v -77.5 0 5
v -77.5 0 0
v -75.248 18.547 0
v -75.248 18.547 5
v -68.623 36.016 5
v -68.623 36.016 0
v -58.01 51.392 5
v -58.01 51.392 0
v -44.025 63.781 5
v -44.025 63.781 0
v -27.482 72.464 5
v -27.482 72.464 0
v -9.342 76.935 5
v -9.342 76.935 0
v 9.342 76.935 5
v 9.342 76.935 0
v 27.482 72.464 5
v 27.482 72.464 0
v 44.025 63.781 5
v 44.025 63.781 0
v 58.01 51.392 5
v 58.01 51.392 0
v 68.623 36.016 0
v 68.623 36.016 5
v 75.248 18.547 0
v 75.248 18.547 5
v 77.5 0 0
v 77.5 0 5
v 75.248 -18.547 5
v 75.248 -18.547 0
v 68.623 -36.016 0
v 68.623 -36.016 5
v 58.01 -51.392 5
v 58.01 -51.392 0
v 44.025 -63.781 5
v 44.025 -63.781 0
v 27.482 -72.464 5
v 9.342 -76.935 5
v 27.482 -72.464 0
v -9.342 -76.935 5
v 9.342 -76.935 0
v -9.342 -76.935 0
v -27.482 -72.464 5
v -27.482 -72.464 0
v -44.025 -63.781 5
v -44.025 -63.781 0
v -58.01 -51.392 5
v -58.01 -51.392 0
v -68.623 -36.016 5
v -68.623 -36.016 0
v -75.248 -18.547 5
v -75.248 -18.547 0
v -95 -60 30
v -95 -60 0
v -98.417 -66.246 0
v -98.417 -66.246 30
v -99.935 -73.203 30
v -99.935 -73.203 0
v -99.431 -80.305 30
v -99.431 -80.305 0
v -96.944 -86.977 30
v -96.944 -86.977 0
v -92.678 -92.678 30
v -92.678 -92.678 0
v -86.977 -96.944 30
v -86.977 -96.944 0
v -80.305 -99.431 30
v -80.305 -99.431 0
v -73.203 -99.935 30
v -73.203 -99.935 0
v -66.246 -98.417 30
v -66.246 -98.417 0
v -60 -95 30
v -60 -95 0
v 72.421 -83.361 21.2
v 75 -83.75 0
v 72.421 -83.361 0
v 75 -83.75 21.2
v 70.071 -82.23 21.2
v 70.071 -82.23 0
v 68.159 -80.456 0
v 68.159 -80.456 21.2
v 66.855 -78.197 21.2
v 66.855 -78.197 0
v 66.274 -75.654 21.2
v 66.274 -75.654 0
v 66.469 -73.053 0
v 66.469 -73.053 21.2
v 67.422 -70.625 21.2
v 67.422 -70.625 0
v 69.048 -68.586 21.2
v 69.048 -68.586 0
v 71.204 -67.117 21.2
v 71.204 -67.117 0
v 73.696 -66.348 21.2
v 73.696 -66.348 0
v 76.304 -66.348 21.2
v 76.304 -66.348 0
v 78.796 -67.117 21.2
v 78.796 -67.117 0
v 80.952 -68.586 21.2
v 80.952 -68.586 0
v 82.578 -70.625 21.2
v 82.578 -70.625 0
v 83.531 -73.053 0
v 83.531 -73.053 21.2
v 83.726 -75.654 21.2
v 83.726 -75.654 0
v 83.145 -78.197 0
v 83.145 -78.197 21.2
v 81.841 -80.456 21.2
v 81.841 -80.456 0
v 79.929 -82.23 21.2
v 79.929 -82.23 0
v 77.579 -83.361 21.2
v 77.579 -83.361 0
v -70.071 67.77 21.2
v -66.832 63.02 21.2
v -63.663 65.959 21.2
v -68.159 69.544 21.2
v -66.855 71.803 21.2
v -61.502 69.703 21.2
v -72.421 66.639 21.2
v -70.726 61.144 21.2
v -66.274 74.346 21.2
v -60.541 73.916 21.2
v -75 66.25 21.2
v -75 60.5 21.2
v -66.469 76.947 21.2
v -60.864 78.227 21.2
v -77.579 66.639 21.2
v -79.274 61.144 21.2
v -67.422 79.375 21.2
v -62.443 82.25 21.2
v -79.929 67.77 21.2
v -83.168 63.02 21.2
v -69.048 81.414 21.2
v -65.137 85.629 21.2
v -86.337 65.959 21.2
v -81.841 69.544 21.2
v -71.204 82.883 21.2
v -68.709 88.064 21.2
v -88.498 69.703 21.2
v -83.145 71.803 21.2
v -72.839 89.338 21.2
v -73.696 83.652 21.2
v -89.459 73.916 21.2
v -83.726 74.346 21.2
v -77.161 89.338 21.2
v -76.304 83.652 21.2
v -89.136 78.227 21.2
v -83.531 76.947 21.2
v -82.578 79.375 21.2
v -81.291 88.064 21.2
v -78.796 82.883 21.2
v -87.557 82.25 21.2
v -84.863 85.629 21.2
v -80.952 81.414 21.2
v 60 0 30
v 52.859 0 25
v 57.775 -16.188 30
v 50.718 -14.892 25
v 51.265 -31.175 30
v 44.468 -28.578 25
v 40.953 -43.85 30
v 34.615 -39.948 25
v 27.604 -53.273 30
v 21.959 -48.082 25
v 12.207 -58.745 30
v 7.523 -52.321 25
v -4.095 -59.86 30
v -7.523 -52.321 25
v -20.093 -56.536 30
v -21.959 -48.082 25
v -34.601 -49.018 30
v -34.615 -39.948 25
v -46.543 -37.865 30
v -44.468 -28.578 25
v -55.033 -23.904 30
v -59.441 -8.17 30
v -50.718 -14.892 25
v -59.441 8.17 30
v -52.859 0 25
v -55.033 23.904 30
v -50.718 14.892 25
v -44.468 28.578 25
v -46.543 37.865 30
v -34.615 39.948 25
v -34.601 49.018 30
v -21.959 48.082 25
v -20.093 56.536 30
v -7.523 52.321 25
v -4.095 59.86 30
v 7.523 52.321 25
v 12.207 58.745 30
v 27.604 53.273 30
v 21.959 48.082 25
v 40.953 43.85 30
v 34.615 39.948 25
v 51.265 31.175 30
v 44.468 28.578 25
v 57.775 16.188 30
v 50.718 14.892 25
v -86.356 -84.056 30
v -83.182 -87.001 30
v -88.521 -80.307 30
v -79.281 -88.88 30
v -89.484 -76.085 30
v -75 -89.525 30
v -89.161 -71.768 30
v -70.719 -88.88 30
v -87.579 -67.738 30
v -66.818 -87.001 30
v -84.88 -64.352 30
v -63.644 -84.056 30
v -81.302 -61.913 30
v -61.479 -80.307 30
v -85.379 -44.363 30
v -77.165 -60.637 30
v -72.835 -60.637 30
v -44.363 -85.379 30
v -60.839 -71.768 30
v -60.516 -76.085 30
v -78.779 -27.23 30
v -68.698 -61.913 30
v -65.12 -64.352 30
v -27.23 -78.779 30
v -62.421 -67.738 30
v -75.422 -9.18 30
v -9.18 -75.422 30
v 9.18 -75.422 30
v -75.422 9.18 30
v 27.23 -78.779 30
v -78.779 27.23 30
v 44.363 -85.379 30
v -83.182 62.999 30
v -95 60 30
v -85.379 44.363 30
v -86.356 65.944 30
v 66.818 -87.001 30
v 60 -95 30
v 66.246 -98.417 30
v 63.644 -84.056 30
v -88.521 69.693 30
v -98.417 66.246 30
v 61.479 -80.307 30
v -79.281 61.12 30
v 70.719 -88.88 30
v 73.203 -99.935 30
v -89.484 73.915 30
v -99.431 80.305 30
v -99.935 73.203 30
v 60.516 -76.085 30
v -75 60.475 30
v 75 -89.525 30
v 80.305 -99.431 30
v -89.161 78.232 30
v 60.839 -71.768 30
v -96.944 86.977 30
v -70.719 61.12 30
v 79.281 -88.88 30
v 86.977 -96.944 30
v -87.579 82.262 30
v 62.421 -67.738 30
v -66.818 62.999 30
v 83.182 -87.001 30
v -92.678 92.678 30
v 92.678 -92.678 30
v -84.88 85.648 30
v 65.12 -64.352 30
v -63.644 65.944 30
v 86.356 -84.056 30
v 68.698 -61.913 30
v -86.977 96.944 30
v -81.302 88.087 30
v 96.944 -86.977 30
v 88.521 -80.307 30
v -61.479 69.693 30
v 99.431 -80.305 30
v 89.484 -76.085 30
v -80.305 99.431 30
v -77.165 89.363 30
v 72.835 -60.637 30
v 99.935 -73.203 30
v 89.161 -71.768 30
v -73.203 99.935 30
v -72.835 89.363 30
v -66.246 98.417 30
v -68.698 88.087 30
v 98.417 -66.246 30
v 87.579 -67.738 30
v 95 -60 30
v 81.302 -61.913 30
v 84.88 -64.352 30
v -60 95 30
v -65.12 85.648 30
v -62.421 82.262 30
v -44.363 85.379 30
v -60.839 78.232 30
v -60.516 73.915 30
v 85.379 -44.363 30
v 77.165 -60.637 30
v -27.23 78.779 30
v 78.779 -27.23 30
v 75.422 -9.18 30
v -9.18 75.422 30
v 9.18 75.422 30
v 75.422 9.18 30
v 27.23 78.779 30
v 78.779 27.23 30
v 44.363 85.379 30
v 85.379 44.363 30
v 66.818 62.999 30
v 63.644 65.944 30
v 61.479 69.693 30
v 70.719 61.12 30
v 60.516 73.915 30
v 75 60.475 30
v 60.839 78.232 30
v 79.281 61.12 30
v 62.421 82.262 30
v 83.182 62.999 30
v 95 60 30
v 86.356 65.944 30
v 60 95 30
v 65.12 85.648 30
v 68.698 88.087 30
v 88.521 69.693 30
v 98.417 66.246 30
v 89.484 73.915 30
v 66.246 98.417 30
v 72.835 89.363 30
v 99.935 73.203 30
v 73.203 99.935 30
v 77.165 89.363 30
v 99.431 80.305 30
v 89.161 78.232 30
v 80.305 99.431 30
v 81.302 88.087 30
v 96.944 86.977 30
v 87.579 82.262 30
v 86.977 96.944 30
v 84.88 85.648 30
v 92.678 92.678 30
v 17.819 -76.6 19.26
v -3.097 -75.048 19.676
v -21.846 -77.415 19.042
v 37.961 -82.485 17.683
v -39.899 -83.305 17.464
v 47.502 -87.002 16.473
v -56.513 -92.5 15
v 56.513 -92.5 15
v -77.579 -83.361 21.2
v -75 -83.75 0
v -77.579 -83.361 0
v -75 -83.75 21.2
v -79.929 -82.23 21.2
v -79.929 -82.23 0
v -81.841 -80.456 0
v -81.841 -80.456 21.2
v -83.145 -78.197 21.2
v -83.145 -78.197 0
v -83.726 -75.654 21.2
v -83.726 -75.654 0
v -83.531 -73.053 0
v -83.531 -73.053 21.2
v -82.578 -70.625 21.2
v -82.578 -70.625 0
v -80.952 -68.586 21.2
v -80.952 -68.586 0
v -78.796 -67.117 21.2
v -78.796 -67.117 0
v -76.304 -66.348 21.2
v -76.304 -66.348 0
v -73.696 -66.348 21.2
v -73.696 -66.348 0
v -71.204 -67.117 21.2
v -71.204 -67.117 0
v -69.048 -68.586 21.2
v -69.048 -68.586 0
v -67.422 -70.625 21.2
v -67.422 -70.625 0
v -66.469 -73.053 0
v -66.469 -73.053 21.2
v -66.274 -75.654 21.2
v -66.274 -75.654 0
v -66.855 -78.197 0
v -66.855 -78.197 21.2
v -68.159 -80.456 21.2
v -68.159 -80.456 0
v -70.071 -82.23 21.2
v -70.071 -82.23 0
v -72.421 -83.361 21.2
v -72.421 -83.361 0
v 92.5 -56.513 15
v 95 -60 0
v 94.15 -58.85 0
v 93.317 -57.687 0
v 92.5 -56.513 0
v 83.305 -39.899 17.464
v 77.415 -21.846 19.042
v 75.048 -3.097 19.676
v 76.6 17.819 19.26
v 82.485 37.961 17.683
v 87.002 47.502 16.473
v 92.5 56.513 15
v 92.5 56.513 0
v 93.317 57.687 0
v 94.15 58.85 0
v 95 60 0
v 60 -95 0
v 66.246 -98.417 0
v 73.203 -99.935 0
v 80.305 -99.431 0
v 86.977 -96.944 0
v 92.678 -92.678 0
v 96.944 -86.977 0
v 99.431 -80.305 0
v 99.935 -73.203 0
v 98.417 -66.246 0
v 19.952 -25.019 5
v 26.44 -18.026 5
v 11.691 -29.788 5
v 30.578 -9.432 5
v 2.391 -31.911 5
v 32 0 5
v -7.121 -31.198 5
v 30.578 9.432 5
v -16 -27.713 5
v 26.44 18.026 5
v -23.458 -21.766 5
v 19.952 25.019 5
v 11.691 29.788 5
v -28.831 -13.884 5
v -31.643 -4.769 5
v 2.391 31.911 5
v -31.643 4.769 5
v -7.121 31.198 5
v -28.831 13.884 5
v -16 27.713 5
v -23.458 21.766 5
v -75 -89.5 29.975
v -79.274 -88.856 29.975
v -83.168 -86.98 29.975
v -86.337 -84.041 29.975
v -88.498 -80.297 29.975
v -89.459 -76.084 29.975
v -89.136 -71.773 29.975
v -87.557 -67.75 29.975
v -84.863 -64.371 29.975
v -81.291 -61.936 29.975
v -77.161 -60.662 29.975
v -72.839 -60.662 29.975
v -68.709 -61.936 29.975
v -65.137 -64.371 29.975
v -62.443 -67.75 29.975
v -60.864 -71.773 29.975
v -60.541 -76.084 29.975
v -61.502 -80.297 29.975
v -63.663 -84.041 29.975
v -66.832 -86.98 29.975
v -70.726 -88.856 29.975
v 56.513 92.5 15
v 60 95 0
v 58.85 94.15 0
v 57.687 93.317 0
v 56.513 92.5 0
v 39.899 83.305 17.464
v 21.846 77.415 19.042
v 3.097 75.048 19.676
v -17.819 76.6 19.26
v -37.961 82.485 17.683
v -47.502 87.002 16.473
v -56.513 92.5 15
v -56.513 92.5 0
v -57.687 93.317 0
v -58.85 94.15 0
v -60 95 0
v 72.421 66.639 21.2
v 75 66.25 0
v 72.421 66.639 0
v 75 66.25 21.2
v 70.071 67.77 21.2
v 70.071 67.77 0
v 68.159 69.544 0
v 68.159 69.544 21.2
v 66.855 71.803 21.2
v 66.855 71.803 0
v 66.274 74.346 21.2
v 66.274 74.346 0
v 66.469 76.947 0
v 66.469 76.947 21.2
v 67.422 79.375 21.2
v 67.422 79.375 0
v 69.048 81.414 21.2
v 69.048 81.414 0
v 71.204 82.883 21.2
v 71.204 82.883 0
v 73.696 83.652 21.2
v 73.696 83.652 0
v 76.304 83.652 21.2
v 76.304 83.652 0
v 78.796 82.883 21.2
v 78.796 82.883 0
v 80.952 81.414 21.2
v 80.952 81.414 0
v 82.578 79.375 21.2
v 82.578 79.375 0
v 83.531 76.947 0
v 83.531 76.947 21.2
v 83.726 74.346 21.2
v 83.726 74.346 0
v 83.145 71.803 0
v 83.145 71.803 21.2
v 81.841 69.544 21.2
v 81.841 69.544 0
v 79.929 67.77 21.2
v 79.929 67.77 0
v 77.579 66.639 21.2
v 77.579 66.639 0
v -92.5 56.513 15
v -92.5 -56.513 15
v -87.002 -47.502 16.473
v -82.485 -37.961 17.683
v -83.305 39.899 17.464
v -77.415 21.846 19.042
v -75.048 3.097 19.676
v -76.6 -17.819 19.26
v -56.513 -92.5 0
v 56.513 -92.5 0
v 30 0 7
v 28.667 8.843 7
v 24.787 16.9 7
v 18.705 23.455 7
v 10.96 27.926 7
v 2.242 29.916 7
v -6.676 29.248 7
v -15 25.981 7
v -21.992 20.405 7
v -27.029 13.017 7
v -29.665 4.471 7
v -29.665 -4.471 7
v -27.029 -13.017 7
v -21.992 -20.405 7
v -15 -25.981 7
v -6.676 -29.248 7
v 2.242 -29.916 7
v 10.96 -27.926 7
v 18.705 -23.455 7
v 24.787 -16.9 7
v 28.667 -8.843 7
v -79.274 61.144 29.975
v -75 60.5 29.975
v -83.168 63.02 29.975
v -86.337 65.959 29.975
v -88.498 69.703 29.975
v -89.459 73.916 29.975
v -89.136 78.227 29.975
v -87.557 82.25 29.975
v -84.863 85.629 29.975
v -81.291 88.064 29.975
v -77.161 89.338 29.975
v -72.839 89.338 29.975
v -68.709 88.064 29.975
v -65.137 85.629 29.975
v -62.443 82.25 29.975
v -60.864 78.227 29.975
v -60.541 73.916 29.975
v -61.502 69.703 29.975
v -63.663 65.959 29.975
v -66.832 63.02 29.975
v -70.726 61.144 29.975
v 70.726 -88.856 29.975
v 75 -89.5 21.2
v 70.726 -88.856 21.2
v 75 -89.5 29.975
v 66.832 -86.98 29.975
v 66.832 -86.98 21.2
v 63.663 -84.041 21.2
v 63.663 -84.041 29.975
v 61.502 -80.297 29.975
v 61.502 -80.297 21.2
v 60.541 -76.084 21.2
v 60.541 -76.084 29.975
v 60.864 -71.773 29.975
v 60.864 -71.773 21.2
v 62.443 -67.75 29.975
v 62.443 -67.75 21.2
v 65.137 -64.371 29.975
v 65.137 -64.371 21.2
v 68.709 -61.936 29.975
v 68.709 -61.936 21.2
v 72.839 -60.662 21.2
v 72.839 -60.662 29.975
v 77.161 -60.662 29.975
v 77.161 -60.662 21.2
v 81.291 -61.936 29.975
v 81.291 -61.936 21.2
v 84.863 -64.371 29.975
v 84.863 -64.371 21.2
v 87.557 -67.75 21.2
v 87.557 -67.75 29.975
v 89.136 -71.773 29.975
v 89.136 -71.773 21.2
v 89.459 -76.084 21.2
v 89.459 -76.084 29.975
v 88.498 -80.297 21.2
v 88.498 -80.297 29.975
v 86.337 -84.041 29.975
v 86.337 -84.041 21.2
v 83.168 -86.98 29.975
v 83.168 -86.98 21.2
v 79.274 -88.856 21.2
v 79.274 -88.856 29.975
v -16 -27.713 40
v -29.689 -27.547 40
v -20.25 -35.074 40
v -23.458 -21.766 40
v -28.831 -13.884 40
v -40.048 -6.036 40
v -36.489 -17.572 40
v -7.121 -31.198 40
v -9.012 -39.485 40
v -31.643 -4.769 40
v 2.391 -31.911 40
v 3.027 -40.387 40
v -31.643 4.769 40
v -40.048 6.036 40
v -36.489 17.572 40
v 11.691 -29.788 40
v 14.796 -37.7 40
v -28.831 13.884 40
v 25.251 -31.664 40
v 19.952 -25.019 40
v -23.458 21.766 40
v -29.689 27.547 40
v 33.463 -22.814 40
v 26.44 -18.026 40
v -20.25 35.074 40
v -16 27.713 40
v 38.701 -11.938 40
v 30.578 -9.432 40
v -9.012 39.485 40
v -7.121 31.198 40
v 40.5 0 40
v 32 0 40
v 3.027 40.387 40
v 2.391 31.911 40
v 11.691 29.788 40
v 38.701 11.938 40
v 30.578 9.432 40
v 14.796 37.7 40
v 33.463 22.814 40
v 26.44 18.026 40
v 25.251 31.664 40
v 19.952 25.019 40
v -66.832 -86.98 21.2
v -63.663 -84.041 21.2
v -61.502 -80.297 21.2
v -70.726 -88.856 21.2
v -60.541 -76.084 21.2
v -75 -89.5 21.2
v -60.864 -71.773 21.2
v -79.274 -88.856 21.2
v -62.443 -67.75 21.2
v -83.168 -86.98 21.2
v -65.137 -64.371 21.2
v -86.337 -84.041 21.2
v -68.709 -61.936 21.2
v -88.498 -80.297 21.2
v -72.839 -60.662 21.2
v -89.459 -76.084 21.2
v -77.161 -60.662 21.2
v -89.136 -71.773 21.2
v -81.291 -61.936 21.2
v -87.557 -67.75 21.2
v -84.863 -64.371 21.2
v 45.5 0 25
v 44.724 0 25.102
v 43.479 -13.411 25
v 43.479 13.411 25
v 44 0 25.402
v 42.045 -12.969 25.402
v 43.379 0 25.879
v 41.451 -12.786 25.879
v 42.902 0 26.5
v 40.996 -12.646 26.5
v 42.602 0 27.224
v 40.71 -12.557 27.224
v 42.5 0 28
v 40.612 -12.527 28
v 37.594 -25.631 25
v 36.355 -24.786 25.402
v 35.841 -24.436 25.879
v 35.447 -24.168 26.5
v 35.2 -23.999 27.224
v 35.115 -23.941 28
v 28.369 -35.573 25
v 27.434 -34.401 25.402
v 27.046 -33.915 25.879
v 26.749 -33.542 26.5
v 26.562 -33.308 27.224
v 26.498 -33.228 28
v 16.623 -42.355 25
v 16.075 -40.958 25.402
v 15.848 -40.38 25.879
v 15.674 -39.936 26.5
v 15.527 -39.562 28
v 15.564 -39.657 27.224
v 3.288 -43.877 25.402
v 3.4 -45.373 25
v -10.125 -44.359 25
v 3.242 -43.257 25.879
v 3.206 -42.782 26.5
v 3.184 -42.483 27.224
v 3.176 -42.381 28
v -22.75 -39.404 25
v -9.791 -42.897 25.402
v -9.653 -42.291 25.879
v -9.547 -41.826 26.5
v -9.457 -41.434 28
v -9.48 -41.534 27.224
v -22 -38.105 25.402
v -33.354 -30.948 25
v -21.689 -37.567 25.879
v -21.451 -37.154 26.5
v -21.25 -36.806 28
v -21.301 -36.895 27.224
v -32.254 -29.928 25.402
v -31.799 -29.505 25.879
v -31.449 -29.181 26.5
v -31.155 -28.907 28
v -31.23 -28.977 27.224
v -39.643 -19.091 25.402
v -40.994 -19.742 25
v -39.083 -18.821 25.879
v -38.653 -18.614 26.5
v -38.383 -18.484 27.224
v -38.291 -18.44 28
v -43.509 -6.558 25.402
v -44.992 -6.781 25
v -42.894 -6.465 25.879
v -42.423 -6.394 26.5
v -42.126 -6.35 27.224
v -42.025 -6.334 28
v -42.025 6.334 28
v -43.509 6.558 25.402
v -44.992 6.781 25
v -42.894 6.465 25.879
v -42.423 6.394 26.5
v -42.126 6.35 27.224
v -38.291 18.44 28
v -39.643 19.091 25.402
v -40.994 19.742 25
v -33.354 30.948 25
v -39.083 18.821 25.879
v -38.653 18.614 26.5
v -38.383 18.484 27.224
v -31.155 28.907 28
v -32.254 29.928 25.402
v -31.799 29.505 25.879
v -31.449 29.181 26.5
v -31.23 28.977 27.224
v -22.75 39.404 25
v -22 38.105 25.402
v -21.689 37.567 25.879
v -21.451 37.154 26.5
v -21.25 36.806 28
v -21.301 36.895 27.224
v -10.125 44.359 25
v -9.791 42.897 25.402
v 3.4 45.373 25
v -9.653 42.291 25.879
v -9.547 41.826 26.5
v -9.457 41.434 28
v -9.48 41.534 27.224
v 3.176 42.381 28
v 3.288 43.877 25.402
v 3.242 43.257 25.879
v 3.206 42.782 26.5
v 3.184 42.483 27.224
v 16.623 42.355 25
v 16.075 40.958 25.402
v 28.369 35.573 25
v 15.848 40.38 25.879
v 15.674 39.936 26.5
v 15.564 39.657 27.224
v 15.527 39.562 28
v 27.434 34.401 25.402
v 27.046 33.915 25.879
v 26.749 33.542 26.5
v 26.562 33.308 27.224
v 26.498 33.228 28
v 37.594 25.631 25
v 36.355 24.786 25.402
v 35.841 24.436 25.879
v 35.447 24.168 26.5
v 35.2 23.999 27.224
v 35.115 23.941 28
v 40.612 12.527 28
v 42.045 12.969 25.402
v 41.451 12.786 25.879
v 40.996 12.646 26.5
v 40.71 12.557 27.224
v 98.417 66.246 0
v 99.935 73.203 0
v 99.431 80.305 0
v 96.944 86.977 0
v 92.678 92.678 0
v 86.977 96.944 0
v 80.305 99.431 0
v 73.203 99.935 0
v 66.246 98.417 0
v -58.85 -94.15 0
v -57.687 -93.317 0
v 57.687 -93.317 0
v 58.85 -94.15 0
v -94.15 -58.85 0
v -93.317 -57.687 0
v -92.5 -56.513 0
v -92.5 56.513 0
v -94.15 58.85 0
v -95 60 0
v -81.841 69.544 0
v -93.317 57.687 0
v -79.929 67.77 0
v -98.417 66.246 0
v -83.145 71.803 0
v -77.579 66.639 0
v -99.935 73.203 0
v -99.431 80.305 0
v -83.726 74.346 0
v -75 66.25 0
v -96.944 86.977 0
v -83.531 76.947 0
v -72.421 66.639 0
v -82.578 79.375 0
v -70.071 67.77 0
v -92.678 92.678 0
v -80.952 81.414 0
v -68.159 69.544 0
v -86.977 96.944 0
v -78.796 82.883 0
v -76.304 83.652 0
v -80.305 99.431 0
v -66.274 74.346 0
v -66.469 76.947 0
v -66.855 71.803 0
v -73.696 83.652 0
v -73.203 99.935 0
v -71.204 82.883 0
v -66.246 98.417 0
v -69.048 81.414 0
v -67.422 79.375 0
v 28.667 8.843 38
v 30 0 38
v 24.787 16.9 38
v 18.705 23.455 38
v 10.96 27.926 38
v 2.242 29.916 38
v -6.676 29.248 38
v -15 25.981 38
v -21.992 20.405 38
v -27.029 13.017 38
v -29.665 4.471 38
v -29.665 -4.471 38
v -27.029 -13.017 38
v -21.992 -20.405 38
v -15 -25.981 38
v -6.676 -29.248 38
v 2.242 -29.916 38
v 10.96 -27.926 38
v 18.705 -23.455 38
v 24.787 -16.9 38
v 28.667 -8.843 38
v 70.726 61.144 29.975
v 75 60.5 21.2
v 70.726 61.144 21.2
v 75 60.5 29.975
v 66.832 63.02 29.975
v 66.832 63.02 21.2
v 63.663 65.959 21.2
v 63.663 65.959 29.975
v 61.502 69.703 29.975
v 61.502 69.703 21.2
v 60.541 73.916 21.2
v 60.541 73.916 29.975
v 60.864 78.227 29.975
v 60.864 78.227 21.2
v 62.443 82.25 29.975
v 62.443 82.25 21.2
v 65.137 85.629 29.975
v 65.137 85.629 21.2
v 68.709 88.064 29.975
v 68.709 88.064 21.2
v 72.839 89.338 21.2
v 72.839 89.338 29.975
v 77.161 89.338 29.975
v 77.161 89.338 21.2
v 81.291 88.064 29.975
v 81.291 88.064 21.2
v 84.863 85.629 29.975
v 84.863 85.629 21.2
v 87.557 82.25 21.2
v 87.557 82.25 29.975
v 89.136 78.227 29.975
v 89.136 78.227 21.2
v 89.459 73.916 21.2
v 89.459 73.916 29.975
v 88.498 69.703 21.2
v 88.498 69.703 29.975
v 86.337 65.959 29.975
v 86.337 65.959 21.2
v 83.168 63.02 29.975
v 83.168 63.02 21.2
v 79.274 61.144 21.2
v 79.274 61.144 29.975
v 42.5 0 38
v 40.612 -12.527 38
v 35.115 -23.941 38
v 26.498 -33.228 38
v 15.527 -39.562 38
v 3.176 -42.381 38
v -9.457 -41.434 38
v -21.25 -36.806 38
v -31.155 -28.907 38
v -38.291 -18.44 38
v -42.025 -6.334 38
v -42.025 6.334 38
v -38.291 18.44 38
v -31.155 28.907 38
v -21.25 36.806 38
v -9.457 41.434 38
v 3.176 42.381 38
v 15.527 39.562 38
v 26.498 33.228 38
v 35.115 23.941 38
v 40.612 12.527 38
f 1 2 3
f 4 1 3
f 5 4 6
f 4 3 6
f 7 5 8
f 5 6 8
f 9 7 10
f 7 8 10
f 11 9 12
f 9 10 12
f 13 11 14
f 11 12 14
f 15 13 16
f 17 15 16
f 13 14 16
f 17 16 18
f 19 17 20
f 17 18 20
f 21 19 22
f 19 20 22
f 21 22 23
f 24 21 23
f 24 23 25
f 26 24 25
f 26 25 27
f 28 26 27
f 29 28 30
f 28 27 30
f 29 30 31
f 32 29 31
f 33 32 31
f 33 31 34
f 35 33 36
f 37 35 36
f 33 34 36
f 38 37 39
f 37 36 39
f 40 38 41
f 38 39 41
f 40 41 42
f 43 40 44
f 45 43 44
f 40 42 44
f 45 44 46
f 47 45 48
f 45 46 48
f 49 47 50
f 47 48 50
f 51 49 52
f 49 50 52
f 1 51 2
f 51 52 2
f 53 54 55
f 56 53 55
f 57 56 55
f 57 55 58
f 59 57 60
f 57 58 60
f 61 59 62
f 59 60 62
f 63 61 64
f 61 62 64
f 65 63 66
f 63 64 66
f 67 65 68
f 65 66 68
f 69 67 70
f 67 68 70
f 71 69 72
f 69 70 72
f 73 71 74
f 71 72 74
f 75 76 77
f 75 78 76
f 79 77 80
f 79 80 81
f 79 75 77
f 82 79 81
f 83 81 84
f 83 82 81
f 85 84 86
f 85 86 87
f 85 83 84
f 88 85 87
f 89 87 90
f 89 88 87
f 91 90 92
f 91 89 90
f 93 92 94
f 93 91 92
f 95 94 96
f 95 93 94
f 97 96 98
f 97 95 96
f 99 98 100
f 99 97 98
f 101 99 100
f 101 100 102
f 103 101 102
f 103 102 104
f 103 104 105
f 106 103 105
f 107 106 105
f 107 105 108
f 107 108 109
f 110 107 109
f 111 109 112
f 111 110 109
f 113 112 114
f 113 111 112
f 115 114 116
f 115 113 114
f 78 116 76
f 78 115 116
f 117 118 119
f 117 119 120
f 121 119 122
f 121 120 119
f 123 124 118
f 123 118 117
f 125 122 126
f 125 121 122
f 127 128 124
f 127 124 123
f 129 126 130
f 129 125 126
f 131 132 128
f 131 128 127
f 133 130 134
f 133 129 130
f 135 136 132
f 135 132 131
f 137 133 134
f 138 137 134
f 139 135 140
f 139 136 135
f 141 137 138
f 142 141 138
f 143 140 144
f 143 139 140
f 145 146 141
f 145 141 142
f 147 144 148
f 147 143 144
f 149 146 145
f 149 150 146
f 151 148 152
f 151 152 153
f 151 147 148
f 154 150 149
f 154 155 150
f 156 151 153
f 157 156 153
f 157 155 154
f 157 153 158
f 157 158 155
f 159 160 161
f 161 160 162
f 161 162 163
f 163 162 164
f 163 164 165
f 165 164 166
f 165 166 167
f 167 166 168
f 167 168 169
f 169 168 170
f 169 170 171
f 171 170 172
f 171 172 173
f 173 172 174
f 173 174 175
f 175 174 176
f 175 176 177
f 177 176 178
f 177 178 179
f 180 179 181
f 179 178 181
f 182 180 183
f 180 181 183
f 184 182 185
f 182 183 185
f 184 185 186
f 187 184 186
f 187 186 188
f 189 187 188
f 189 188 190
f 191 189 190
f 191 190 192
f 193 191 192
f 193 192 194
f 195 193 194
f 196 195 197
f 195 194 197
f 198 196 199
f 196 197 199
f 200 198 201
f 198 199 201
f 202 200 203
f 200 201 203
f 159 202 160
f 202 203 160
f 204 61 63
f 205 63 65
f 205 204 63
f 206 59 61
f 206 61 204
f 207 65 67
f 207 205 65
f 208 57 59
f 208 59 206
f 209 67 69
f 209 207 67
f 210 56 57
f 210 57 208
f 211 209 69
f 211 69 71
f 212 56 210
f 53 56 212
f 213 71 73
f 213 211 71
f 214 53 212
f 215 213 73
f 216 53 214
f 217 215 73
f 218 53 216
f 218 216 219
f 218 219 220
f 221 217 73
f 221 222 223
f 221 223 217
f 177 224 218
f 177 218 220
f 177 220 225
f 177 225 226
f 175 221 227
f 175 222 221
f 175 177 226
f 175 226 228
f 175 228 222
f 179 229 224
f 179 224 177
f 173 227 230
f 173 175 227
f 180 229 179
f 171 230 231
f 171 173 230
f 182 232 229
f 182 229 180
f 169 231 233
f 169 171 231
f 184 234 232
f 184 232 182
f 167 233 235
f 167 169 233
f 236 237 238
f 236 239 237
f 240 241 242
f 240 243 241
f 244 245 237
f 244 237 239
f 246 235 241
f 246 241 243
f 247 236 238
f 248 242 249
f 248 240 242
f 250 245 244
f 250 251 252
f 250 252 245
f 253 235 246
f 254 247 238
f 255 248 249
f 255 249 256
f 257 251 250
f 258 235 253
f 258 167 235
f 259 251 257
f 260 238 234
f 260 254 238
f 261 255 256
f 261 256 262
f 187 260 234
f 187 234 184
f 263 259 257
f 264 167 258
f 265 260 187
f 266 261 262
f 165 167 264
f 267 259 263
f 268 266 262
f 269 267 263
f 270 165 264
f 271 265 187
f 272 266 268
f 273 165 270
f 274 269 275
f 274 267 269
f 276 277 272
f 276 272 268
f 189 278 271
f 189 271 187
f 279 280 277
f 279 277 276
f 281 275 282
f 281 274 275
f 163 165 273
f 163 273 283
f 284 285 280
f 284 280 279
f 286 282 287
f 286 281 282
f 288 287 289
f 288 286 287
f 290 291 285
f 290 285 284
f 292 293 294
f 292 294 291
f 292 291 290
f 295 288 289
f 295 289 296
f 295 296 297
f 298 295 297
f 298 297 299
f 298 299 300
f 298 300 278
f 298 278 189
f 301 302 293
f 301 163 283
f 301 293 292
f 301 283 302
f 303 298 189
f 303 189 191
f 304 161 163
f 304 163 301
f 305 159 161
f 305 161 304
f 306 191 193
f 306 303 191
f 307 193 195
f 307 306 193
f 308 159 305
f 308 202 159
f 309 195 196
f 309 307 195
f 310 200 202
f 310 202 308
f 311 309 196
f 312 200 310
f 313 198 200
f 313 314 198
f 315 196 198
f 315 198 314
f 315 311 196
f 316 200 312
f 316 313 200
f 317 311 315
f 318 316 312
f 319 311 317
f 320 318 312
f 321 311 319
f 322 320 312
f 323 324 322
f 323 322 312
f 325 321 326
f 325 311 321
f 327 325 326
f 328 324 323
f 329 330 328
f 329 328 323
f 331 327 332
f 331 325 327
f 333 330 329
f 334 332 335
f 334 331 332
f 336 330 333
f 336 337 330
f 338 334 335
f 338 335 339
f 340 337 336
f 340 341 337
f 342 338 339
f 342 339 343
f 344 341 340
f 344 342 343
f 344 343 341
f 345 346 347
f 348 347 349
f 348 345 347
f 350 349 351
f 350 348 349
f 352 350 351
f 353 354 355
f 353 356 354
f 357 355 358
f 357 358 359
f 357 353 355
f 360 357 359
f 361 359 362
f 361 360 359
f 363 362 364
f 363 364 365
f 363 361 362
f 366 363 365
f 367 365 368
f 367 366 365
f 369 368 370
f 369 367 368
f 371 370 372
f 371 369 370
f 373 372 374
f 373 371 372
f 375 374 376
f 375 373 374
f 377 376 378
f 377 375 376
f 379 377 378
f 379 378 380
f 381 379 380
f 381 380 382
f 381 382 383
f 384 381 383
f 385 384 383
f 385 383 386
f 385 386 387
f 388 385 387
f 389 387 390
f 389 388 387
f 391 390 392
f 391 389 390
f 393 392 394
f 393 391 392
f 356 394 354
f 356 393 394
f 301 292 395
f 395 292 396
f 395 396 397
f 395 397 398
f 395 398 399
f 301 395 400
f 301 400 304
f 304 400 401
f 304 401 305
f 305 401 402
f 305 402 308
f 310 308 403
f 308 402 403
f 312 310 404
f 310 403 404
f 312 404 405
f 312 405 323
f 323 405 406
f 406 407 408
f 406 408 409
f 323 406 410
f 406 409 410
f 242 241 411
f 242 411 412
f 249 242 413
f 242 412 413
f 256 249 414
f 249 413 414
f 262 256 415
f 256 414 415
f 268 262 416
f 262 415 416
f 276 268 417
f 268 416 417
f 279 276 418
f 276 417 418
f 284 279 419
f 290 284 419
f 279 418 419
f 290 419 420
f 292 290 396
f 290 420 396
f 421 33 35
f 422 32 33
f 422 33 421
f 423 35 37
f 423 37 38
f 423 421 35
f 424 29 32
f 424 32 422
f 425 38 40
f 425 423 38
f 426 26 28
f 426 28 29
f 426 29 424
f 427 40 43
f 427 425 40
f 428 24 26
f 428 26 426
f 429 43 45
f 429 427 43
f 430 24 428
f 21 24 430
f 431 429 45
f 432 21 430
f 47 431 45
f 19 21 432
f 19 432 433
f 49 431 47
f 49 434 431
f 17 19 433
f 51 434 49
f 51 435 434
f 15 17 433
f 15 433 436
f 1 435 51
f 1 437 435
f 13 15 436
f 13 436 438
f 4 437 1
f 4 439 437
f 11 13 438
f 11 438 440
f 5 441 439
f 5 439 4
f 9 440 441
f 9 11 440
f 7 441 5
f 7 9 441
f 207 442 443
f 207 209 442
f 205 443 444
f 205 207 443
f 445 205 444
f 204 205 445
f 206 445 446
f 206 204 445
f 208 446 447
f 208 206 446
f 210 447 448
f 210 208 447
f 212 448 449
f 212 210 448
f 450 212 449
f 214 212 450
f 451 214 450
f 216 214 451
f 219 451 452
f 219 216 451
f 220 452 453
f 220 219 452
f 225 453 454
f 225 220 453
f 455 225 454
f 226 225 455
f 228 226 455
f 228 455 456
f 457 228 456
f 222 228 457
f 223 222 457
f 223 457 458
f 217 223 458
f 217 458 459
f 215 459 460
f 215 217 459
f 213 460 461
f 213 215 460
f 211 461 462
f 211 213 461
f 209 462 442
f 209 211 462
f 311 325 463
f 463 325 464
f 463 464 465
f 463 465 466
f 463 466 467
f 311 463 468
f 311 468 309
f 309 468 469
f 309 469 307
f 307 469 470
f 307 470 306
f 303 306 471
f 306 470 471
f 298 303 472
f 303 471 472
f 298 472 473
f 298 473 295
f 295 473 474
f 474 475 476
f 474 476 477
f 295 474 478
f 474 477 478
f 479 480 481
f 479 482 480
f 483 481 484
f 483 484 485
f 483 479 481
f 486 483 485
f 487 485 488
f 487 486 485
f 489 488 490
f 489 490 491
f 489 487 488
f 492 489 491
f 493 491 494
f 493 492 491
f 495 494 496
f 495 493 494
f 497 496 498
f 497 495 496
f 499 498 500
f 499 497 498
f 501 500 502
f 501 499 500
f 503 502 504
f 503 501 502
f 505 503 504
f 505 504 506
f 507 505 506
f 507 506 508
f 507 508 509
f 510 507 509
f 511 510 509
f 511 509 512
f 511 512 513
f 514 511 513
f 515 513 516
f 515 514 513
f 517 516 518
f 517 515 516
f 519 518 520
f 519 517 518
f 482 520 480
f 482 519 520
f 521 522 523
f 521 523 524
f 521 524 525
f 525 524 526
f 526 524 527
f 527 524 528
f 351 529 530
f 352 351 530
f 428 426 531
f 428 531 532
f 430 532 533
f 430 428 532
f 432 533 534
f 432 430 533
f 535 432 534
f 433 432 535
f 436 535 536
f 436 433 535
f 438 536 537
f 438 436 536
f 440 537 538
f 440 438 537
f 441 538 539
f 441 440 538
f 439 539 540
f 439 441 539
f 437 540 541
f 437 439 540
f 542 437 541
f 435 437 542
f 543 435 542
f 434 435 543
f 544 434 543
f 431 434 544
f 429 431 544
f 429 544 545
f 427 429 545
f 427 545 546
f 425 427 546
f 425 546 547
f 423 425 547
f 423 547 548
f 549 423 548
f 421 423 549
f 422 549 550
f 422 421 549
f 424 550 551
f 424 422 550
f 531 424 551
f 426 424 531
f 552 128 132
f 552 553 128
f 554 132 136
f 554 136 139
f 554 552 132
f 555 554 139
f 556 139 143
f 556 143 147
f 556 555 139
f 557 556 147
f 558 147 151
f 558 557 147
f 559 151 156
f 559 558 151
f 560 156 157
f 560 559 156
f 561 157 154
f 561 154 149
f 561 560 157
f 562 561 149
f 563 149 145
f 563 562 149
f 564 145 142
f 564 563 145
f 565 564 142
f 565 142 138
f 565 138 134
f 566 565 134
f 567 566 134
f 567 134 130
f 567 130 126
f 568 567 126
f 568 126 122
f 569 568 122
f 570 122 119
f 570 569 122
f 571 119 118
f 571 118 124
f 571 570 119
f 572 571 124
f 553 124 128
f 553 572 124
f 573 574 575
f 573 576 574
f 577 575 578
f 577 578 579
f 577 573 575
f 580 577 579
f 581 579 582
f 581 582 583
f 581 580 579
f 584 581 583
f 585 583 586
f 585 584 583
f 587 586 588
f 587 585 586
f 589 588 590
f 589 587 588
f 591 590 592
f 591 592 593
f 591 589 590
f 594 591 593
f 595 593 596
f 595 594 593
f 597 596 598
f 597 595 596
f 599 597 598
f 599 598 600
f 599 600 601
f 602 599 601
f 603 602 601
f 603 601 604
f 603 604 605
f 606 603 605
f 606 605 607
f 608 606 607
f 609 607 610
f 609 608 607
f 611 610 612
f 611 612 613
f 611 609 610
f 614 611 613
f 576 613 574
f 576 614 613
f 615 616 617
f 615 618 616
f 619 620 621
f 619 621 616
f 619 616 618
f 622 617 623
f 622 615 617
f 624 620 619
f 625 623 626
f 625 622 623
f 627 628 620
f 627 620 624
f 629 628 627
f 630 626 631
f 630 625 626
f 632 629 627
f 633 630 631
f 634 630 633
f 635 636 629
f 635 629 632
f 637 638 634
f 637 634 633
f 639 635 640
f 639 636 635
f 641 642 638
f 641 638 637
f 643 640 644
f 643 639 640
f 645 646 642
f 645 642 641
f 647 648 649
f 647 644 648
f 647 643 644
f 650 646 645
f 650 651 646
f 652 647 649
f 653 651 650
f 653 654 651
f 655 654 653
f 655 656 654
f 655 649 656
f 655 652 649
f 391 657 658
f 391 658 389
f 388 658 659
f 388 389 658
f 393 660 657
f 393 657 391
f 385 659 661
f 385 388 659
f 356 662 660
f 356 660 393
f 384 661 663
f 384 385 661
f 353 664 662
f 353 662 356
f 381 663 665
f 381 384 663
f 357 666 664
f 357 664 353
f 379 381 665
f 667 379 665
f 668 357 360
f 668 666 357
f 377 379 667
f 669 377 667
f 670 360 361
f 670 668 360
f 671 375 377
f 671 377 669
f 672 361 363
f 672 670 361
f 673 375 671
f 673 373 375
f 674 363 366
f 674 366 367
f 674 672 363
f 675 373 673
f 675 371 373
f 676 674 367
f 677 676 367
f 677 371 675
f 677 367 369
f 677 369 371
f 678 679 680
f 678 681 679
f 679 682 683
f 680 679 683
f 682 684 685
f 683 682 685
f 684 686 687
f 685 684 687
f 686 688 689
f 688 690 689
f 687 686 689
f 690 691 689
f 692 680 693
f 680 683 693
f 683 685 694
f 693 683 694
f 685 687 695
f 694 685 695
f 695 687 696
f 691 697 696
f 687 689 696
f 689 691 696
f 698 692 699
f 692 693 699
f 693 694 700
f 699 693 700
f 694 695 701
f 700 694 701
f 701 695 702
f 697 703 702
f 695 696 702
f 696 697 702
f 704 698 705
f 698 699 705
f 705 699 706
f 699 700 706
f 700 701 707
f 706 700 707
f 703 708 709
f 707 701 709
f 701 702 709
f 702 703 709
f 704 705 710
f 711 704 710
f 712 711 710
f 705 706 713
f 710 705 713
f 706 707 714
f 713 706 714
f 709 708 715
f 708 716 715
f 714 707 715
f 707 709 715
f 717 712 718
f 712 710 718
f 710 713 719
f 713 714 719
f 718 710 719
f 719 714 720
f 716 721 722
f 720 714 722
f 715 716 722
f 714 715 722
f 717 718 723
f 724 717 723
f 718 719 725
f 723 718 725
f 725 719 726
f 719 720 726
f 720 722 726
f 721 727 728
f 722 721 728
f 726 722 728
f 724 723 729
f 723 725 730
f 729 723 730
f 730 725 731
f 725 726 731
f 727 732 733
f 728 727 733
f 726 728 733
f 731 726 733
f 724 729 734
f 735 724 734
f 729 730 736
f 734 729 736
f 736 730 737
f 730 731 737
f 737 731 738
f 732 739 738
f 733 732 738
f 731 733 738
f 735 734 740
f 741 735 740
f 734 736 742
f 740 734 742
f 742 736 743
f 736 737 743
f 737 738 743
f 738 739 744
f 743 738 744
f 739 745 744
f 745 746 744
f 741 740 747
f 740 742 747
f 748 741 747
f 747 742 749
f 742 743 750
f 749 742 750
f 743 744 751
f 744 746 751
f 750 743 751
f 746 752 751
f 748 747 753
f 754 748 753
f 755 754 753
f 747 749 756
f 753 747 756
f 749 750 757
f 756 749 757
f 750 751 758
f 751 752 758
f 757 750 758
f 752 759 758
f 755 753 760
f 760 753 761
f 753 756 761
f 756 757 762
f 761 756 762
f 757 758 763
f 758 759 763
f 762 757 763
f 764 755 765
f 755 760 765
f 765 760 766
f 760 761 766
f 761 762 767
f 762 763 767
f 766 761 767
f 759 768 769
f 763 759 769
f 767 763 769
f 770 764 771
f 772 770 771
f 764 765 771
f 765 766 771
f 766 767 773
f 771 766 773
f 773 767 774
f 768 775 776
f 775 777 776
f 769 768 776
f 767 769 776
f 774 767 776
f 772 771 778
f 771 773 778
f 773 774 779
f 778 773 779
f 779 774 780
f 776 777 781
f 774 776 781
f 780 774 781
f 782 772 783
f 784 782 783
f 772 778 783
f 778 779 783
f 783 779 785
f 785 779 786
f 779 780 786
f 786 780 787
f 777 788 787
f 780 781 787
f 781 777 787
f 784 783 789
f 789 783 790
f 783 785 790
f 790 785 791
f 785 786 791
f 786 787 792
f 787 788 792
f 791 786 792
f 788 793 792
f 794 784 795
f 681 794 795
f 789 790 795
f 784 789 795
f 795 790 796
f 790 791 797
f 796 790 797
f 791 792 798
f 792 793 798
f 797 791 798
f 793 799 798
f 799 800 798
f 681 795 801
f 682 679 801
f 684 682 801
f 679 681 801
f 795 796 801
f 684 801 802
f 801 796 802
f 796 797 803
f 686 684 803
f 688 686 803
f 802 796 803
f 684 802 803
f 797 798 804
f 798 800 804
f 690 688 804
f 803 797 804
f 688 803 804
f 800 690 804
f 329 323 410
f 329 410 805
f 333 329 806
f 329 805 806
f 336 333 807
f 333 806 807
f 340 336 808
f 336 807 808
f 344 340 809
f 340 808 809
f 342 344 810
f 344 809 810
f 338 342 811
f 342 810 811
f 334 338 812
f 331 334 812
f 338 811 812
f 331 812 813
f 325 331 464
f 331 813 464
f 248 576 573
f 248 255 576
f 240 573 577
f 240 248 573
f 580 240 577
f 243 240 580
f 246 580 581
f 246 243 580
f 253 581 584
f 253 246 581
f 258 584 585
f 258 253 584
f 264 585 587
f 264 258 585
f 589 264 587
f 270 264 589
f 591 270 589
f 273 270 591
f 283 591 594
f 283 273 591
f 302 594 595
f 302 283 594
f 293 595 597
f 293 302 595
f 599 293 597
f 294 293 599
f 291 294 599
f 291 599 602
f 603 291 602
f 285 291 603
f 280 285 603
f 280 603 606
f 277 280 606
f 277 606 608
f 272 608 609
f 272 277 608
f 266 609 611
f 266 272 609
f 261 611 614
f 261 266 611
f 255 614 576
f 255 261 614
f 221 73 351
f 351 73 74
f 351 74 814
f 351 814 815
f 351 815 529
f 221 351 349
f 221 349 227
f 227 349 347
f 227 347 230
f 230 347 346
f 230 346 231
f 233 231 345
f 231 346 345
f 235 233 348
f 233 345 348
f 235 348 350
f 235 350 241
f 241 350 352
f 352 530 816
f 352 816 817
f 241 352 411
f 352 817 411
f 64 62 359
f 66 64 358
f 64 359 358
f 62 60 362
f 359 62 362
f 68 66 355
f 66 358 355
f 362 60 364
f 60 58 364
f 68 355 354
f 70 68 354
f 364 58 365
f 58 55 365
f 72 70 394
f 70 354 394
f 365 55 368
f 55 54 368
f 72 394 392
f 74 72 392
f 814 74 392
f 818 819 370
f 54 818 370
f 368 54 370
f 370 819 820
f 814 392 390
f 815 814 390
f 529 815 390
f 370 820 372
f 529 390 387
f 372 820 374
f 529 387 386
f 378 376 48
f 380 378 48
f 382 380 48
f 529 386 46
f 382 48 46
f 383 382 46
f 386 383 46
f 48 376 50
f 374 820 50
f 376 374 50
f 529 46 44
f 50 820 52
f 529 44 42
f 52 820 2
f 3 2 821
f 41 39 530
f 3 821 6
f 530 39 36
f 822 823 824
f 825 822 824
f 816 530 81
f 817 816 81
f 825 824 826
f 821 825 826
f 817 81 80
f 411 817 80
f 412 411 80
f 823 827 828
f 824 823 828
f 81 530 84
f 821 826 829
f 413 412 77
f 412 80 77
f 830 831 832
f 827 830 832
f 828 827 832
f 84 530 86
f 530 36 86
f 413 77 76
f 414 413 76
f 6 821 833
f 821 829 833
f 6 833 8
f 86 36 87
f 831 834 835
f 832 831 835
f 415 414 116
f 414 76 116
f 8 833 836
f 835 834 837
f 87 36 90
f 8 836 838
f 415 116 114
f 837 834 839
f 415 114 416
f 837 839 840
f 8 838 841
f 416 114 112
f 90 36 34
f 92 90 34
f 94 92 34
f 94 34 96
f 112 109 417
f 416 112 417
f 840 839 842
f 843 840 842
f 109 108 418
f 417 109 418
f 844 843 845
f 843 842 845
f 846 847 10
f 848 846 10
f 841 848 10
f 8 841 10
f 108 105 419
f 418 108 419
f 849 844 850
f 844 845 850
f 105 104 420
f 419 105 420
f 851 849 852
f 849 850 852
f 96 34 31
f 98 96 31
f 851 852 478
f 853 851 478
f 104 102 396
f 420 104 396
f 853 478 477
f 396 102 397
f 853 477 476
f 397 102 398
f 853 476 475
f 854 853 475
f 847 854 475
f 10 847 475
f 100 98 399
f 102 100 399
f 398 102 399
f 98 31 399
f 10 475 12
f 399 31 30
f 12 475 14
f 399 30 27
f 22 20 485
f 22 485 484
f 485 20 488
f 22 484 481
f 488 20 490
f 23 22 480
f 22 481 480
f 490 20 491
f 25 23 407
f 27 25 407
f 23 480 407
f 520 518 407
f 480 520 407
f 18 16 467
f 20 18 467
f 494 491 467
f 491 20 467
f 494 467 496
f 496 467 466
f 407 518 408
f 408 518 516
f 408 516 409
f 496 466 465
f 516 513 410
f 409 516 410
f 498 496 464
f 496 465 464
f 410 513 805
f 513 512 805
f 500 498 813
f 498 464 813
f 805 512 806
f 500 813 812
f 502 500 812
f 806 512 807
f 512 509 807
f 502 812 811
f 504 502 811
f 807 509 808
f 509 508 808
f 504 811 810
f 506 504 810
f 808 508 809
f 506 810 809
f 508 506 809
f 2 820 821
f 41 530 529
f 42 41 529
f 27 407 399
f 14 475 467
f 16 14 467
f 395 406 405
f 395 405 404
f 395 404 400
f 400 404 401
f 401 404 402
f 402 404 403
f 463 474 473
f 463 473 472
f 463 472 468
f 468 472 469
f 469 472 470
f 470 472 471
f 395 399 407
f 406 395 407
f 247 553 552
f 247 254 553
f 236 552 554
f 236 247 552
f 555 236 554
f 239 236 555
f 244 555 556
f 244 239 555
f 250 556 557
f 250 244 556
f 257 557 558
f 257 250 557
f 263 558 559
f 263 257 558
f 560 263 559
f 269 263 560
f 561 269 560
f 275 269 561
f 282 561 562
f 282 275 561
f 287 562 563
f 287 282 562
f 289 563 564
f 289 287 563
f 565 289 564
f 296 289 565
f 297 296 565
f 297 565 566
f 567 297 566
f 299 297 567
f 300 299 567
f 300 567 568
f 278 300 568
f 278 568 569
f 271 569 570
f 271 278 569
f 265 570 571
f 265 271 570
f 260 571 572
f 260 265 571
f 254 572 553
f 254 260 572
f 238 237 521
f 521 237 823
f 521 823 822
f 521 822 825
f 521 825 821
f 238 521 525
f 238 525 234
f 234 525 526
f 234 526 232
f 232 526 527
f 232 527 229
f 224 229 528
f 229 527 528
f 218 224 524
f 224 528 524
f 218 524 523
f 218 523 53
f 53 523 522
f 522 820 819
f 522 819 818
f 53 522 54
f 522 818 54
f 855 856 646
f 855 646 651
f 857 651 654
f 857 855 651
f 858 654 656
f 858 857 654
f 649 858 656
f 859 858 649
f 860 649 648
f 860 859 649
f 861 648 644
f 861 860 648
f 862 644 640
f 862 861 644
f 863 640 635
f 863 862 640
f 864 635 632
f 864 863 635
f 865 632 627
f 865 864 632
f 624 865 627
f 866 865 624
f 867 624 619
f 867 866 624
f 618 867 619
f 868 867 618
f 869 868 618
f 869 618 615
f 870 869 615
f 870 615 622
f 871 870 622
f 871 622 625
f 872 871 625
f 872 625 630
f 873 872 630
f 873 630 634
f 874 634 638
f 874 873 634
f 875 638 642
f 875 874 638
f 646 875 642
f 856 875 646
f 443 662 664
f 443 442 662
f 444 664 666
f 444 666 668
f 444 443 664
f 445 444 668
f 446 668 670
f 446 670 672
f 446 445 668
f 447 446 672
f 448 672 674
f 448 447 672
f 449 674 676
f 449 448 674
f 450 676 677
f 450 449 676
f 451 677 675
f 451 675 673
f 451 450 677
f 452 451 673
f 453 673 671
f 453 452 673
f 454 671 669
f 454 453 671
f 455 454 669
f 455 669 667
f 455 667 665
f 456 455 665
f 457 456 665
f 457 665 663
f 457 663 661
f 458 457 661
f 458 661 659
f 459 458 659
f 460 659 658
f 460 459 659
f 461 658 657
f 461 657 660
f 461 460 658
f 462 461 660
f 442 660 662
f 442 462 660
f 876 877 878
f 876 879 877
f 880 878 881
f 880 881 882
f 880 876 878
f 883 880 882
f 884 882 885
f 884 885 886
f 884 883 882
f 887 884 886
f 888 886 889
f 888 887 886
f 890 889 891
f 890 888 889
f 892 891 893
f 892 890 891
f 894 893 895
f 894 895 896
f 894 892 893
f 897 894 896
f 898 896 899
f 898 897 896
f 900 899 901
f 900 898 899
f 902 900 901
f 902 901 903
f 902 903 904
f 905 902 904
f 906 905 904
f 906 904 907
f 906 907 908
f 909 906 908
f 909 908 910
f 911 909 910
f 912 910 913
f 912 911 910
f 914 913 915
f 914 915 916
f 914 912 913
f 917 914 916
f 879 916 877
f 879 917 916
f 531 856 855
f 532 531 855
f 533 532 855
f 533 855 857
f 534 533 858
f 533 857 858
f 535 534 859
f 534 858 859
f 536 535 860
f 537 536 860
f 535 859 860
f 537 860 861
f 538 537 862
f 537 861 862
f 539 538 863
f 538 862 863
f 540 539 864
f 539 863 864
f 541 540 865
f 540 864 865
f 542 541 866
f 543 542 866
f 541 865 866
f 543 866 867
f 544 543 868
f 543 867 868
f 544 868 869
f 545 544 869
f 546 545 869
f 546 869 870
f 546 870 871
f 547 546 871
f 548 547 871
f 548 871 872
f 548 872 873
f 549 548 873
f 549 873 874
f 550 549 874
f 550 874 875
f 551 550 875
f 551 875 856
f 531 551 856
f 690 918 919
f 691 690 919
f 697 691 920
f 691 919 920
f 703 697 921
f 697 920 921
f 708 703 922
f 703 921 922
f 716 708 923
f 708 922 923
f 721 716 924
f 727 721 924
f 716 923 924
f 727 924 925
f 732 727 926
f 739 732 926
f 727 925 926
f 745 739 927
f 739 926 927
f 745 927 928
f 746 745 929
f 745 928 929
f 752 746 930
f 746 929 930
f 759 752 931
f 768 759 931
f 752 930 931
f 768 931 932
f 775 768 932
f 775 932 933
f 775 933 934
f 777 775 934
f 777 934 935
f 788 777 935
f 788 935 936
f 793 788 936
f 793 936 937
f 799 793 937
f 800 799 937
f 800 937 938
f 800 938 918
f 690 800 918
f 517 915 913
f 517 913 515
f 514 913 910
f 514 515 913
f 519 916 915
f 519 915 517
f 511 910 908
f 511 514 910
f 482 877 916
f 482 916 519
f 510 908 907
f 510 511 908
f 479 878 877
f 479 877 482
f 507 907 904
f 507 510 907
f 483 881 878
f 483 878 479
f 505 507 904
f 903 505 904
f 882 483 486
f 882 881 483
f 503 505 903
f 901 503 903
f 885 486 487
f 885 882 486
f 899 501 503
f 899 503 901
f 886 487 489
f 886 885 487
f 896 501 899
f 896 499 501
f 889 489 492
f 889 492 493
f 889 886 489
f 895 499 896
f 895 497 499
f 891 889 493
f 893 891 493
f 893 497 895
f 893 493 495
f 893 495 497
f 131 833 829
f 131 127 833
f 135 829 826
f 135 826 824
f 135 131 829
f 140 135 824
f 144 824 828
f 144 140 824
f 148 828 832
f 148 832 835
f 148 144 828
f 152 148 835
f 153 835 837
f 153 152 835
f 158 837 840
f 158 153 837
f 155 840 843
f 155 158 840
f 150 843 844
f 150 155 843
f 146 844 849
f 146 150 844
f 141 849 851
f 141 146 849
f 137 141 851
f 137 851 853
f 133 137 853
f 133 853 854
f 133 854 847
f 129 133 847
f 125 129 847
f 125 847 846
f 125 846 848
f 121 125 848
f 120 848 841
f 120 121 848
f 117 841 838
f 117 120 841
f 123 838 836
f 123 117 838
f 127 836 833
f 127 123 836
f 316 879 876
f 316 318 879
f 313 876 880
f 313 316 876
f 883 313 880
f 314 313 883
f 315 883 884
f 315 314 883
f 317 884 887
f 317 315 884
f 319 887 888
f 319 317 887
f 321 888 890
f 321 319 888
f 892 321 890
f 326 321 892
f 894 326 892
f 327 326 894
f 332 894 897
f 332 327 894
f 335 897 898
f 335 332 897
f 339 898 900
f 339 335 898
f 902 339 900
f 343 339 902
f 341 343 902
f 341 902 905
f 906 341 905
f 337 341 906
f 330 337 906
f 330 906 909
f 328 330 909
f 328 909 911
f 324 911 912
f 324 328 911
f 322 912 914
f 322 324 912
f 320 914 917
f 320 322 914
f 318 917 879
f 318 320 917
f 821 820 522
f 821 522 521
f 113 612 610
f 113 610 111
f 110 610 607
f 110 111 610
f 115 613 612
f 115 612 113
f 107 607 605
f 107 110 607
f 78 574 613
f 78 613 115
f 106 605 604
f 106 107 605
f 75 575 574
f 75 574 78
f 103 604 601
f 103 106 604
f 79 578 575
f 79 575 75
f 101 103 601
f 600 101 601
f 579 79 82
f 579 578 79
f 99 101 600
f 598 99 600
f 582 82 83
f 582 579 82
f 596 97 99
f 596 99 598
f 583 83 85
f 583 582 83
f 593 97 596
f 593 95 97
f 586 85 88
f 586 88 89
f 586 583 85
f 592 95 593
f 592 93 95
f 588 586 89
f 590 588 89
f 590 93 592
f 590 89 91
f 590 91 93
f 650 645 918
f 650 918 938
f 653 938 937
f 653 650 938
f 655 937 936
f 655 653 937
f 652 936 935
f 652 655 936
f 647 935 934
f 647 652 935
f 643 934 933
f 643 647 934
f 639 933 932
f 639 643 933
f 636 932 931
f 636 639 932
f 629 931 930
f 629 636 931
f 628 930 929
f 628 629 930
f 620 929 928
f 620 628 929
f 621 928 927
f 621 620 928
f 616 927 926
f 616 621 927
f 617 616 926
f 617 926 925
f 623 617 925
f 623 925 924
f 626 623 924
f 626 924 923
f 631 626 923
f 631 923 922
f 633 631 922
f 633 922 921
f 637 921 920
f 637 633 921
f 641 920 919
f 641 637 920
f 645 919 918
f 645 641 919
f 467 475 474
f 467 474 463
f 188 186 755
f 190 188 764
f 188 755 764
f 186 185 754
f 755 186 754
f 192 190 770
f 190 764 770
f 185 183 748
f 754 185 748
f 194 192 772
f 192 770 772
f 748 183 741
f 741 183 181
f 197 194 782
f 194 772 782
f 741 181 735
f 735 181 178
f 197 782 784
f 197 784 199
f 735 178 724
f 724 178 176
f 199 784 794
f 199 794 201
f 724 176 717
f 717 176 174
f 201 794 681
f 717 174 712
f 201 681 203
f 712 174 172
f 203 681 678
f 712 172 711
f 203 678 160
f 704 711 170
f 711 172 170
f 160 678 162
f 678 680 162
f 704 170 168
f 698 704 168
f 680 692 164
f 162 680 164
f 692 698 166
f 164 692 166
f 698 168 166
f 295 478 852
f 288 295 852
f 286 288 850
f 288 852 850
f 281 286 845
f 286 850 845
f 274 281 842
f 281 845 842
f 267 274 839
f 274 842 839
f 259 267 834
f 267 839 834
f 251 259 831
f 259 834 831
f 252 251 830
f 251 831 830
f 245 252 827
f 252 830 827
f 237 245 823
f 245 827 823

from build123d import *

# Parameters (mm, degrees)
SKETCH1_R                       = 25
BOSS_EXTRUDE1_DEPTH             = 30
SKETCH2_W                       = 185
SKETCH2_H                       = 185
BOSS_EXTRUDE2_DEPTH             = 15
DRAFT1_ANGLE                    = 15
DRAFT2_ANGLE                    = 15
DRAFT3_ANGLE                    = 15
DRAFT4_ANGLE                    = 15
SKETCH3_R                       = 42.5
BOSS_EXTRUDE3_DEPTH             = 40
CBORE_FOR_M16_SBHCS1_AT_2_COUNT = 2
CBORE_FOR_M16_SBHCS1_AT_2_PITCH = 150
CBORE_FOR_M16_SBHCS1_AT_3_COUNT = 2
CBORE_FOR_M16_SBHCS1_AT_3_PITCH = 150
CBORE_FOR_M16_SBHCS1_AT_4_COUNT = 2
CBORE_FOR_M16_SBHCS1_AT_4_PITCH = 212.132034356
SKETCH6_R                       = 30
CUT_EXTRUDE1_DEPTH              = 147.969384567
SKETCH7_R                       = 77.5
CUT_EXTRUDE2_DEPTH              = 5
FILLET1_R                       = 3
CHAMFER1_SIZE                   = 2


with BuildPart() as part:
    # Sketch1 → Boss-Extrude1 (new body)
    with BuildSketch(Plane.XY):
        with BuildLine():
            ThreePointArc((-60, 95), (-52.639320225, 86.180339887), (-50, 75))
            ThreePointArc((-50, 75), (-67.09430585, 51.282917549), (-95, 60))
            ThreePointArc((-95, 60), (-75, 0), (-95, -60))
            ThreePointArc((-95, -60), (-67.09430585, -51.282917549), (-50, -75))
            ThreePointArc((-50, -75), (-52.639320225, -86.180339887), (-60, -95))
            ThreePointArc((-60, -95), (0, -75), (60, -95))
            ThreePointArc((60, -95), (57.32233047, -57.32233047), (95, -60))
            ThreePointArc((95, -60), (75, 0), (95, 60))
            ThreePointArc((95, 60), (57.32233047, 57.32233047), (60, 95))
            ThreePointArc((60, 95), (0, 75), (-60, 95))
        make_face()
        with Locations((-75, 75)):
            Circle(SKETCH1_R)
        with Locations((75, 75)):
            Circle(SKETCH1_R)
        with Locations((75, -75)):
            Circle(SKETCH1_R)
        with Locations((-75, -75)):
            Circle(SKETCH1_R)
    extrude(amount=BOSS_EXTRUDE1_DEPTH)

    # Sketch2 → Boss-Extrude2 (add)
    with BuildSketch(Plane.XY):
        Rectangle(SKETCH2_W, SKETCH2_H)
    extrude(amount=BOSS_EXTRUDE2_DEPTH)

    # Draft1
    draft1_faces = [part.faces().sort_by_distance(p)[0] for p in [
        (85.444692503, 0, 15),
    ]]
    draft(draft1_faces, Plane(origin=(92.5, -92.5, 15), x_dir=(0, 0, 1), z_dir=(1, 0, 0)), DRAFT1_ANGLE)

    # Draft2
    draft2_faces = [part.faces().sort_by_distance(p)[0] for p in [
        (0, 85.444692503, 15),
    ]]
    draft(draft2_faces, Plane(origin=(-92.5, 92.5, 15), x_dir=(0, 0, 1), z_dir=(0, 1, 0)), DRAFT2_ANGLE)

    # Draft3
    draft3_faces = [part.faces().sort_by_distance(p)[0] for p in [
        (-85.444692503, 0, 15),
    ]]
    draft(draft3_faces, Plane(origin=(-92.5, -92.5, 15), x_dir=(0, 0, -1), z_dir=(-1, 0, 0)), DRAFT3_ANGLE)

    # Draft4
    draft4_faces = [part.faces().sort_by_distance(p)[0] for p in [
        (0, -85.444692503, 15),
    ]]
    draft(draft4_faces, Plane(origin=(-92.5, -92.5, 15), x_dir=(0, 0, -1), z_dir=(0, -1, 0)), DRAFT4_ANGLE)

    # Sketch3 → Boss-Extrude3 (add)
    with BuildSketch(Plane.XY):
        Circle(SKETCH3_R)
    extrude(amount=BOSS_EXTRUDE3_DEPTH)

    # Sketch5 → CBORE for M16 SBHCS1 (revolve, cut)
    with BuildSketch(Plane(origin=(-75, 75, 30), x_dir=(0, -1, 0), z_dir=(1, 0, 0))):
        Polygon((0, 0), (0, 30), (8.75, 30), (8.75, 8.8), (14.5, 8.8), (14.5, 0.025), (14.525, 0), align=None)
    cbore_for_m16_sbhcs1 = revolve(axis=Axis((-75, 75, 36.35), (0, 0, -1)), mode=Mode.SUBTRACT)

    # CBORE for M16 SBHCS1 at 2: CBORE for M16 SBHCS1 ×2
    with Locations(*[(i * CBORE_FOR_M16_SBHCS1_AT_2_PITCH, 0, 0) for i in range(1, CBORE_FOR_M16_SBHCS1_AT_2_COUNT)]):
        add(cbore_for_m16_sbhcs1, mode=Mode.SUBTRACT)

    # CBORE for M16 SBHCS1 at 3: CBORE for M16 SBHCS1 ×2
    with Locations(*[(0, -i * CBORE_FOR_M16_SBHCS1_AT_3_PITCH, 0) for i in range(1, CBORE_FOR_M16_SBHCS1_AT_3_COUNT)]):
        add(cbore_for_m16_sbhcs1, mode=Mode.SUBTRACT)

    # CBORE for M16 SBHCS1 at 4: CBORE for M16 SBHCS1 ×2
    with Locations(*[Vector(0.7071067811865476, -0.7071067811865476, 0) * (i * CBORE_FOR_M16_SBHCS1_AT_4_PITCH) for i in range(1, CBORE_FOR_M16_SBHCS1_AT_4_COUNT)]):
        add(cbore_for_m16_sbhcs1, mode=Mode.SUBTRACT)

    # Sketch6 → Cut-Extrude1 (cut, through all)
    with BuildSketch(Plane.XY.offset(40)):
        Circle(SKETCH6_R)
    extrude(amount=-CUT_EXTRUDE1_DEPTH, mode=Mode.SUBTRACT)

    # Sketch7 → Cut-Extrude2 (cut)
    with BuildSketch(Plane(origin=(0, 0, 0), x_dir=(-1, 0, 0), z_dir=(0, 0, -1))):
        Circle(SKETCH7_R)
    extrude(amount=-CUT_EXTRUDE2_DEPTH, mode=Mode.SUBTRACT)

    # Sketch8 → Cut-Revolve1 (revolve, cut)
    with BuildSketch(Plane(origin=(0, 0, 0), x_dir=(0, 0, -1), z_dir=(1, 0, 0)), mode=Mode.PRIVATE) as cut_revolve1_sk:
        Polygon((-30, 42.5), (-30, 60), (-25, 52.859259966), (-25, 42.5), align=None)
    revolve(cut_revolve1_sk.sketch.rotate(Axis((0, 0, 77.404119515), (0, 0, -1)), 90), axis=Axis((0, 0, 77.404119515), (0, 0, -1)), mode=Mode.SUBTRACT)

    # Fillet1
    fillet1_edges = [part.edges().sort_by_distance(p)[0] for p in [
        (-42.5, 0, 25),
    ]]
    fillet(fillet1_edges, radius=FILLET1_R)

    # Chamfer1
    chamfer1_edges = [part.edges().sort_by_distance(p)[0] for p in [
        (-30, 0, 40),
        (-30, 0, 5),
        (-42.5, 0, 40),
    ]]
    chamfer(chamfer1_edges, length=CHAMFER1_SIZE)


solid = part.part
